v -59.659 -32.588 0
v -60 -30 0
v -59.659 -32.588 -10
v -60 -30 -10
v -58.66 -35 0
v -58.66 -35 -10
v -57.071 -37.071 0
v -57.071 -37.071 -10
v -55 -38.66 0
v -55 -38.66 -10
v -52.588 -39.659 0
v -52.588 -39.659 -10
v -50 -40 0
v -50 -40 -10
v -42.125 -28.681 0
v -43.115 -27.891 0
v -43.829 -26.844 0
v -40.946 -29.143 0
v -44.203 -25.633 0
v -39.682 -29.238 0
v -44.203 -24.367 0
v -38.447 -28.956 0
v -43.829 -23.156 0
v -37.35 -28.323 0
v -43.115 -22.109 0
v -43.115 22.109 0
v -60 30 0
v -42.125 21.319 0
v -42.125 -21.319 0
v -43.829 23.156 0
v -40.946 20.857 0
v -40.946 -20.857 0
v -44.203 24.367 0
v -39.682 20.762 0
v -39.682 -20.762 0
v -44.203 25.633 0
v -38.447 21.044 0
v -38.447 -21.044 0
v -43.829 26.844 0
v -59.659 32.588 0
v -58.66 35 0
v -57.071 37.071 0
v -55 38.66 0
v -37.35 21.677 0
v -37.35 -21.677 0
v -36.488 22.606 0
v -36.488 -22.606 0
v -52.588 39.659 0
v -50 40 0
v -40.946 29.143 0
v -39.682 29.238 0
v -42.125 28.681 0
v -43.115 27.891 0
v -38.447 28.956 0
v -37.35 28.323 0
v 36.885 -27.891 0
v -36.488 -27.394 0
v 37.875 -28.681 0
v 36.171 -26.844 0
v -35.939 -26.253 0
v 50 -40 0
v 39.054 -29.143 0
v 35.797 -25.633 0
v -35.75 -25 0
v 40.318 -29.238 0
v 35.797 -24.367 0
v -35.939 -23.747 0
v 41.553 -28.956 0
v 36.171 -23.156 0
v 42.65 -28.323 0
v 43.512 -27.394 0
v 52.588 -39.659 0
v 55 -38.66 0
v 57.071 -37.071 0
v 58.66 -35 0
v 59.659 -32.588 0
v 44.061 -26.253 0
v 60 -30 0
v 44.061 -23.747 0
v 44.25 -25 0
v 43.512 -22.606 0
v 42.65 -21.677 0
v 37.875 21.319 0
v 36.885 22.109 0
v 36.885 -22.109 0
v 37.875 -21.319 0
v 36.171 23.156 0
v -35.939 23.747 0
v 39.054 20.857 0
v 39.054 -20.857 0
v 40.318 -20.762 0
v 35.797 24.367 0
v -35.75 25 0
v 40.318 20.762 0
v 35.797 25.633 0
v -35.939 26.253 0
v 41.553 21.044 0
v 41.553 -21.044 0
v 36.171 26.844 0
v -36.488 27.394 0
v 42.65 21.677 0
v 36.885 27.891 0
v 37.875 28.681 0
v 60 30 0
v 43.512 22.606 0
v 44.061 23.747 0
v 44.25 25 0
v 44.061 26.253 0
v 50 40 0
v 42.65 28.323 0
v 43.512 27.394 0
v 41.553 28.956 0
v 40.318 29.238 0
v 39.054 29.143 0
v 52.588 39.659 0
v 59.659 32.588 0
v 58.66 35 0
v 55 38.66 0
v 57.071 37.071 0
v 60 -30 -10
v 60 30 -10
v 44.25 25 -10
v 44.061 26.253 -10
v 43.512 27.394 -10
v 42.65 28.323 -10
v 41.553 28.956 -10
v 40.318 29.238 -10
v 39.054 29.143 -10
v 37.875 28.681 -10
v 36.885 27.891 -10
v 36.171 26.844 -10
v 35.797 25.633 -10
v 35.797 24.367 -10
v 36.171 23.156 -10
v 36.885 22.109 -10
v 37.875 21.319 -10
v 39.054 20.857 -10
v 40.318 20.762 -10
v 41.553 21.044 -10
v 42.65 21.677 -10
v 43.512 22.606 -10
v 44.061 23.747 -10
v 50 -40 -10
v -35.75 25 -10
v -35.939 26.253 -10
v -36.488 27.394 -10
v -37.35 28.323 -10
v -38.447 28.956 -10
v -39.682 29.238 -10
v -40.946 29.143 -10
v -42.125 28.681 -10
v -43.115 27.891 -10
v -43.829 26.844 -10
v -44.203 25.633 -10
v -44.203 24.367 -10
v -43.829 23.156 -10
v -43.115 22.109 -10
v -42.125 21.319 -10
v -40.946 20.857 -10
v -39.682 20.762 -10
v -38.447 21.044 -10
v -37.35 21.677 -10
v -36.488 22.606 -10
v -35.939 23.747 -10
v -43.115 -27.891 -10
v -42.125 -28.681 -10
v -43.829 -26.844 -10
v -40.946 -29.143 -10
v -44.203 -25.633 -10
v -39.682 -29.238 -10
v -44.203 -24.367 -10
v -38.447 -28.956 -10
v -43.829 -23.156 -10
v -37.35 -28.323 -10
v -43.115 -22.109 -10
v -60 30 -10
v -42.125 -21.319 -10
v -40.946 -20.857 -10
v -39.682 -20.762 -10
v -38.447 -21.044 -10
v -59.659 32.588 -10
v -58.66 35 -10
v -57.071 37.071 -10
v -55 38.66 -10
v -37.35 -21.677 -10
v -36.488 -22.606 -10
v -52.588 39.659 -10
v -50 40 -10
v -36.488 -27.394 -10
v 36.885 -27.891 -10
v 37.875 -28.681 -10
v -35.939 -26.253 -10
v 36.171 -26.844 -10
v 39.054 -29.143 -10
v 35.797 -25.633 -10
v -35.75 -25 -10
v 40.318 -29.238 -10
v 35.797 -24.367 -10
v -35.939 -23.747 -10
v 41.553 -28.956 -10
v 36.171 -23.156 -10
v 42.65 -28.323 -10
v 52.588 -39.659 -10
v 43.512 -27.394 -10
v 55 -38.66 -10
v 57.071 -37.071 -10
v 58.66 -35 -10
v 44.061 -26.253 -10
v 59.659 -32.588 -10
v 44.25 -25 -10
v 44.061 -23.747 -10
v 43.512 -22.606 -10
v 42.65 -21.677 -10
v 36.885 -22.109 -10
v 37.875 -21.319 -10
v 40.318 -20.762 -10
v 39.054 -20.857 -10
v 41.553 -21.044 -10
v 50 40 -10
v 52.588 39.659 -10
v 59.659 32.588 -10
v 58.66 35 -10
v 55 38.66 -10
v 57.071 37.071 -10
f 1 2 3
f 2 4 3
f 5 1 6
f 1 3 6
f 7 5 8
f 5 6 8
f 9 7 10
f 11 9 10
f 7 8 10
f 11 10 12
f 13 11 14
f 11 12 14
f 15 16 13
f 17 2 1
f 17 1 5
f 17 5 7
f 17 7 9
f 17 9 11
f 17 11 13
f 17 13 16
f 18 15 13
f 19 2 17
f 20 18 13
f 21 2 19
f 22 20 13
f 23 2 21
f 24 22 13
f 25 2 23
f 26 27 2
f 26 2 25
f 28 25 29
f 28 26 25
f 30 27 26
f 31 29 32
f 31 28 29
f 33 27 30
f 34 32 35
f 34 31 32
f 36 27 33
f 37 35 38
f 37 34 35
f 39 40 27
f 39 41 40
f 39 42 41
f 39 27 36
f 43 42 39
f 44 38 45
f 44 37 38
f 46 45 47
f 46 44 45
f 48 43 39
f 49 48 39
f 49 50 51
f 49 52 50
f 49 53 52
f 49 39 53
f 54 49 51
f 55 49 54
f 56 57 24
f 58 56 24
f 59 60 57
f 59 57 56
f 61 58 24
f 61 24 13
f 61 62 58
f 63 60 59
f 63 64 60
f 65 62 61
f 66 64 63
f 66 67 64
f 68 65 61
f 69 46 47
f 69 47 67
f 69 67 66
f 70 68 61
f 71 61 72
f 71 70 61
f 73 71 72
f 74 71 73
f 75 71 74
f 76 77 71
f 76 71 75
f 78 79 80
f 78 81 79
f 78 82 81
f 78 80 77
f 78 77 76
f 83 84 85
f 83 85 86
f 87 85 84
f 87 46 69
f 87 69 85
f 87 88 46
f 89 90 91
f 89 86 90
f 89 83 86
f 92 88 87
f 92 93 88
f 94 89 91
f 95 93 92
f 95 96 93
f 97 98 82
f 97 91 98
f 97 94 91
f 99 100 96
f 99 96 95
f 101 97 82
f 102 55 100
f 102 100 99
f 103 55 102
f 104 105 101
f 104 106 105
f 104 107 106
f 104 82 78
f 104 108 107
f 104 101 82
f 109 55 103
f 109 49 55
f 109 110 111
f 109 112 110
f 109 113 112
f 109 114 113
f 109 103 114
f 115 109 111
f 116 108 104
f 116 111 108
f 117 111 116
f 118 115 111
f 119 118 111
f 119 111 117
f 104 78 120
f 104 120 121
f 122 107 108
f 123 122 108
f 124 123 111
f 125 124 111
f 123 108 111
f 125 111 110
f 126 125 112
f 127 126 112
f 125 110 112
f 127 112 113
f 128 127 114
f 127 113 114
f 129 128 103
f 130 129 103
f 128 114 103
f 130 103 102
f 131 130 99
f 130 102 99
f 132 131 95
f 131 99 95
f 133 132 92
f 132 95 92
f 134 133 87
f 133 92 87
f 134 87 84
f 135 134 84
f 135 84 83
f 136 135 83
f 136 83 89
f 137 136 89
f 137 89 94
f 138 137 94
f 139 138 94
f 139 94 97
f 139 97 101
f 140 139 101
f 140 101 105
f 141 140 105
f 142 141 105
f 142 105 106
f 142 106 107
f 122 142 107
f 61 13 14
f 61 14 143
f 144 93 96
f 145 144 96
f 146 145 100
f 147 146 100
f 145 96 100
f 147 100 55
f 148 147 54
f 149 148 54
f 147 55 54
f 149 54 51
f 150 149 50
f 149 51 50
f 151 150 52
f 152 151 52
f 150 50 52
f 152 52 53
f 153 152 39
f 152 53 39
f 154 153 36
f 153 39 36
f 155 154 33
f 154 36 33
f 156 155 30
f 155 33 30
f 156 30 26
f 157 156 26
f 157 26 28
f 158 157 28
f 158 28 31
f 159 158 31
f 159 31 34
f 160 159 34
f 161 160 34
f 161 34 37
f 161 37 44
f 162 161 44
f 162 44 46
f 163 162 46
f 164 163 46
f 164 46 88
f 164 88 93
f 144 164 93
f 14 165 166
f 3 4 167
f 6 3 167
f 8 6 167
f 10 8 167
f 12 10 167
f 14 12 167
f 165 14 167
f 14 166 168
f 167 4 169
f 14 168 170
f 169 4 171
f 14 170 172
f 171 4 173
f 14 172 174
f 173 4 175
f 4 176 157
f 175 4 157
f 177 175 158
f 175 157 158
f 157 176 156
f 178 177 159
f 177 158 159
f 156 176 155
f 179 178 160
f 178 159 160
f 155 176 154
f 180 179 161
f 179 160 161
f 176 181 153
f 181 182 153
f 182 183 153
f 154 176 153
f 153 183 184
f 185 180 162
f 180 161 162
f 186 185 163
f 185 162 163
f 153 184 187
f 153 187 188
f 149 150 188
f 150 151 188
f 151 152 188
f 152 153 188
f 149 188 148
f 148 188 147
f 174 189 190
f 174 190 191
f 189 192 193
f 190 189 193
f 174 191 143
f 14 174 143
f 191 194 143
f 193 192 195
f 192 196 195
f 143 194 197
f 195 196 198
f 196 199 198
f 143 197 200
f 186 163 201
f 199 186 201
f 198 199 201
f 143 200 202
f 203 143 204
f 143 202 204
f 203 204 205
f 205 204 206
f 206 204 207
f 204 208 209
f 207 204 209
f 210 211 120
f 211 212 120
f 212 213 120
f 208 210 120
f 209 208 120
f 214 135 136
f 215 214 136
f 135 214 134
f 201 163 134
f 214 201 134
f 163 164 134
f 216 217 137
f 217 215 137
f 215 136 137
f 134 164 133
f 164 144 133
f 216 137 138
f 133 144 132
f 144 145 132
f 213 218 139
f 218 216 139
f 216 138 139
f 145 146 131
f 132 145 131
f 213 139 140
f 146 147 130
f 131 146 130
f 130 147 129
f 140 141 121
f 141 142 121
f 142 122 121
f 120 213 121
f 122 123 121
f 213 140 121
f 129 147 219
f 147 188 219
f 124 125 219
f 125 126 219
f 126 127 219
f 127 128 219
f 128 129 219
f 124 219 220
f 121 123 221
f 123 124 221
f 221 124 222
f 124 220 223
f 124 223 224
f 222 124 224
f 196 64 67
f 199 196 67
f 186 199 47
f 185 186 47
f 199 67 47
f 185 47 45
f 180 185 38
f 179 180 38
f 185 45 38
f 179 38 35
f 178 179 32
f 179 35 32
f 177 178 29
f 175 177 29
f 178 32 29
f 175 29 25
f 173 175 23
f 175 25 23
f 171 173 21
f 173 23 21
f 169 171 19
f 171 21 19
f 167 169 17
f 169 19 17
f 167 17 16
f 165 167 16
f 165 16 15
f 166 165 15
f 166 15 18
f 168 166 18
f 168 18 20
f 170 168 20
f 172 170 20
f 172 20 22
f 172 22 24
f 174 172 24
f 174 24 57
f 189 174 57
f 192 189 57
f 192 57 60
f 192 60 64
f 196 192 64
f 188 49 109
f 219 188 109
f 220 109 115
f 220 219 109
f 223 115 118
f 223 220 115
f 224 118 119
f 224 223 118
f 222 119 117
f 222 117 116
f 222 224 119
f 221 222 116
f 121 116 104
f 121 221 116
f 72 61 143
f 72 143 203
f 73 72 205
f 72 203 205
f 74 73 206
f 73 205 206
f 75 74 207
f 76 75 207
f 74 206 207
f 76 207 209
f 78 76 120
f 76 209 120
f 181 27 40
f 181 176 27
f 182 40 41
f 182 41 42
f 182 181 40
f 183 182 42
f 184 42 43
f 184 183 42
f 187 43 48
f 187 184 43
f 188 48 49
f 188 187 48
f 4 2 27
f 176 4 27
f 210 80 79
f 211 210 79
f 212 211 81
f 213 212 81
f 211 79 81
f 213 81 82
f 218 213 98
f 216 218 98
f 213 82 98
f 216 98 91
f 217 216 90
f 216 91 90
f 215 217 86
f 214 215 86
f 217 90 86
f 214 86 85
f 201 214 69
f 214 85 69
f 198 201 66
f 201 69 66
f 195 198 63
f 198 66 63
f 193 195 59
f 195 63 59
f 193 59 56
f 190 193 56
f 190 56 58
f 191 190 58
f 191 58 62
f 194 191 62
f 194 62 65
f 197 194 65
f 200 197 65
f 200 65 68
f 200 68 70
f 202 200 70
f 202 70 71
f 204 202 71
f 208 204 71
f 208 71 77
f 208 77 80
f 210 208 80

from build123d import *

# Parameters (mm, degrees)
IZIM1_W               = 120
IZIM1_H               = 80
TABAN_FLAN_1_DEPTH    = 10
IZIM6_R               = 4.25
KES_EKSTR_ZYON1_DEPTH = 20
RADYUS1_R             = 10


# Sheet-metal steps are written as plain solids
with BuildPart() as part:
    # Çizim1 → Taban-Flanş1 (new body)
    with BuildSketch(Plane.XY):
        Rectangle(IZIM1_W, IZIM1_H)
    extrude(amount=-TABAN_FLAN_1_DEPTH)

    # Çizim6 → Kes-Ekstrüzyon1 (cut)
    with BuildSketch(Plane.XY):
        with Locations((-40, 25)):
            Circle(IZIM6_R)
        with Locations((40, 25)):
            Circle(IZIM6_R)
        with Locations((40, -25)):
            Circle(IZIM6_R)
        with Locations((-40, -25)):
            Circle(IZIM6_R)
    extrude(amount=-KES_EKSTR_ZYON1_DEPTH, mode=Mode.SUBTRACT)

    # Radyus1
    radyus1_edges = [part.edges().sort_by_distance(p)[0] for p in [
        (60, -40, -5),
        (-60, -40, -5),
        (-60, 40, -5),
        (60, 40, -5),
    ]]
    fillet(radyus1_edges, radius=RADYUS1_R)


solid = part.part
